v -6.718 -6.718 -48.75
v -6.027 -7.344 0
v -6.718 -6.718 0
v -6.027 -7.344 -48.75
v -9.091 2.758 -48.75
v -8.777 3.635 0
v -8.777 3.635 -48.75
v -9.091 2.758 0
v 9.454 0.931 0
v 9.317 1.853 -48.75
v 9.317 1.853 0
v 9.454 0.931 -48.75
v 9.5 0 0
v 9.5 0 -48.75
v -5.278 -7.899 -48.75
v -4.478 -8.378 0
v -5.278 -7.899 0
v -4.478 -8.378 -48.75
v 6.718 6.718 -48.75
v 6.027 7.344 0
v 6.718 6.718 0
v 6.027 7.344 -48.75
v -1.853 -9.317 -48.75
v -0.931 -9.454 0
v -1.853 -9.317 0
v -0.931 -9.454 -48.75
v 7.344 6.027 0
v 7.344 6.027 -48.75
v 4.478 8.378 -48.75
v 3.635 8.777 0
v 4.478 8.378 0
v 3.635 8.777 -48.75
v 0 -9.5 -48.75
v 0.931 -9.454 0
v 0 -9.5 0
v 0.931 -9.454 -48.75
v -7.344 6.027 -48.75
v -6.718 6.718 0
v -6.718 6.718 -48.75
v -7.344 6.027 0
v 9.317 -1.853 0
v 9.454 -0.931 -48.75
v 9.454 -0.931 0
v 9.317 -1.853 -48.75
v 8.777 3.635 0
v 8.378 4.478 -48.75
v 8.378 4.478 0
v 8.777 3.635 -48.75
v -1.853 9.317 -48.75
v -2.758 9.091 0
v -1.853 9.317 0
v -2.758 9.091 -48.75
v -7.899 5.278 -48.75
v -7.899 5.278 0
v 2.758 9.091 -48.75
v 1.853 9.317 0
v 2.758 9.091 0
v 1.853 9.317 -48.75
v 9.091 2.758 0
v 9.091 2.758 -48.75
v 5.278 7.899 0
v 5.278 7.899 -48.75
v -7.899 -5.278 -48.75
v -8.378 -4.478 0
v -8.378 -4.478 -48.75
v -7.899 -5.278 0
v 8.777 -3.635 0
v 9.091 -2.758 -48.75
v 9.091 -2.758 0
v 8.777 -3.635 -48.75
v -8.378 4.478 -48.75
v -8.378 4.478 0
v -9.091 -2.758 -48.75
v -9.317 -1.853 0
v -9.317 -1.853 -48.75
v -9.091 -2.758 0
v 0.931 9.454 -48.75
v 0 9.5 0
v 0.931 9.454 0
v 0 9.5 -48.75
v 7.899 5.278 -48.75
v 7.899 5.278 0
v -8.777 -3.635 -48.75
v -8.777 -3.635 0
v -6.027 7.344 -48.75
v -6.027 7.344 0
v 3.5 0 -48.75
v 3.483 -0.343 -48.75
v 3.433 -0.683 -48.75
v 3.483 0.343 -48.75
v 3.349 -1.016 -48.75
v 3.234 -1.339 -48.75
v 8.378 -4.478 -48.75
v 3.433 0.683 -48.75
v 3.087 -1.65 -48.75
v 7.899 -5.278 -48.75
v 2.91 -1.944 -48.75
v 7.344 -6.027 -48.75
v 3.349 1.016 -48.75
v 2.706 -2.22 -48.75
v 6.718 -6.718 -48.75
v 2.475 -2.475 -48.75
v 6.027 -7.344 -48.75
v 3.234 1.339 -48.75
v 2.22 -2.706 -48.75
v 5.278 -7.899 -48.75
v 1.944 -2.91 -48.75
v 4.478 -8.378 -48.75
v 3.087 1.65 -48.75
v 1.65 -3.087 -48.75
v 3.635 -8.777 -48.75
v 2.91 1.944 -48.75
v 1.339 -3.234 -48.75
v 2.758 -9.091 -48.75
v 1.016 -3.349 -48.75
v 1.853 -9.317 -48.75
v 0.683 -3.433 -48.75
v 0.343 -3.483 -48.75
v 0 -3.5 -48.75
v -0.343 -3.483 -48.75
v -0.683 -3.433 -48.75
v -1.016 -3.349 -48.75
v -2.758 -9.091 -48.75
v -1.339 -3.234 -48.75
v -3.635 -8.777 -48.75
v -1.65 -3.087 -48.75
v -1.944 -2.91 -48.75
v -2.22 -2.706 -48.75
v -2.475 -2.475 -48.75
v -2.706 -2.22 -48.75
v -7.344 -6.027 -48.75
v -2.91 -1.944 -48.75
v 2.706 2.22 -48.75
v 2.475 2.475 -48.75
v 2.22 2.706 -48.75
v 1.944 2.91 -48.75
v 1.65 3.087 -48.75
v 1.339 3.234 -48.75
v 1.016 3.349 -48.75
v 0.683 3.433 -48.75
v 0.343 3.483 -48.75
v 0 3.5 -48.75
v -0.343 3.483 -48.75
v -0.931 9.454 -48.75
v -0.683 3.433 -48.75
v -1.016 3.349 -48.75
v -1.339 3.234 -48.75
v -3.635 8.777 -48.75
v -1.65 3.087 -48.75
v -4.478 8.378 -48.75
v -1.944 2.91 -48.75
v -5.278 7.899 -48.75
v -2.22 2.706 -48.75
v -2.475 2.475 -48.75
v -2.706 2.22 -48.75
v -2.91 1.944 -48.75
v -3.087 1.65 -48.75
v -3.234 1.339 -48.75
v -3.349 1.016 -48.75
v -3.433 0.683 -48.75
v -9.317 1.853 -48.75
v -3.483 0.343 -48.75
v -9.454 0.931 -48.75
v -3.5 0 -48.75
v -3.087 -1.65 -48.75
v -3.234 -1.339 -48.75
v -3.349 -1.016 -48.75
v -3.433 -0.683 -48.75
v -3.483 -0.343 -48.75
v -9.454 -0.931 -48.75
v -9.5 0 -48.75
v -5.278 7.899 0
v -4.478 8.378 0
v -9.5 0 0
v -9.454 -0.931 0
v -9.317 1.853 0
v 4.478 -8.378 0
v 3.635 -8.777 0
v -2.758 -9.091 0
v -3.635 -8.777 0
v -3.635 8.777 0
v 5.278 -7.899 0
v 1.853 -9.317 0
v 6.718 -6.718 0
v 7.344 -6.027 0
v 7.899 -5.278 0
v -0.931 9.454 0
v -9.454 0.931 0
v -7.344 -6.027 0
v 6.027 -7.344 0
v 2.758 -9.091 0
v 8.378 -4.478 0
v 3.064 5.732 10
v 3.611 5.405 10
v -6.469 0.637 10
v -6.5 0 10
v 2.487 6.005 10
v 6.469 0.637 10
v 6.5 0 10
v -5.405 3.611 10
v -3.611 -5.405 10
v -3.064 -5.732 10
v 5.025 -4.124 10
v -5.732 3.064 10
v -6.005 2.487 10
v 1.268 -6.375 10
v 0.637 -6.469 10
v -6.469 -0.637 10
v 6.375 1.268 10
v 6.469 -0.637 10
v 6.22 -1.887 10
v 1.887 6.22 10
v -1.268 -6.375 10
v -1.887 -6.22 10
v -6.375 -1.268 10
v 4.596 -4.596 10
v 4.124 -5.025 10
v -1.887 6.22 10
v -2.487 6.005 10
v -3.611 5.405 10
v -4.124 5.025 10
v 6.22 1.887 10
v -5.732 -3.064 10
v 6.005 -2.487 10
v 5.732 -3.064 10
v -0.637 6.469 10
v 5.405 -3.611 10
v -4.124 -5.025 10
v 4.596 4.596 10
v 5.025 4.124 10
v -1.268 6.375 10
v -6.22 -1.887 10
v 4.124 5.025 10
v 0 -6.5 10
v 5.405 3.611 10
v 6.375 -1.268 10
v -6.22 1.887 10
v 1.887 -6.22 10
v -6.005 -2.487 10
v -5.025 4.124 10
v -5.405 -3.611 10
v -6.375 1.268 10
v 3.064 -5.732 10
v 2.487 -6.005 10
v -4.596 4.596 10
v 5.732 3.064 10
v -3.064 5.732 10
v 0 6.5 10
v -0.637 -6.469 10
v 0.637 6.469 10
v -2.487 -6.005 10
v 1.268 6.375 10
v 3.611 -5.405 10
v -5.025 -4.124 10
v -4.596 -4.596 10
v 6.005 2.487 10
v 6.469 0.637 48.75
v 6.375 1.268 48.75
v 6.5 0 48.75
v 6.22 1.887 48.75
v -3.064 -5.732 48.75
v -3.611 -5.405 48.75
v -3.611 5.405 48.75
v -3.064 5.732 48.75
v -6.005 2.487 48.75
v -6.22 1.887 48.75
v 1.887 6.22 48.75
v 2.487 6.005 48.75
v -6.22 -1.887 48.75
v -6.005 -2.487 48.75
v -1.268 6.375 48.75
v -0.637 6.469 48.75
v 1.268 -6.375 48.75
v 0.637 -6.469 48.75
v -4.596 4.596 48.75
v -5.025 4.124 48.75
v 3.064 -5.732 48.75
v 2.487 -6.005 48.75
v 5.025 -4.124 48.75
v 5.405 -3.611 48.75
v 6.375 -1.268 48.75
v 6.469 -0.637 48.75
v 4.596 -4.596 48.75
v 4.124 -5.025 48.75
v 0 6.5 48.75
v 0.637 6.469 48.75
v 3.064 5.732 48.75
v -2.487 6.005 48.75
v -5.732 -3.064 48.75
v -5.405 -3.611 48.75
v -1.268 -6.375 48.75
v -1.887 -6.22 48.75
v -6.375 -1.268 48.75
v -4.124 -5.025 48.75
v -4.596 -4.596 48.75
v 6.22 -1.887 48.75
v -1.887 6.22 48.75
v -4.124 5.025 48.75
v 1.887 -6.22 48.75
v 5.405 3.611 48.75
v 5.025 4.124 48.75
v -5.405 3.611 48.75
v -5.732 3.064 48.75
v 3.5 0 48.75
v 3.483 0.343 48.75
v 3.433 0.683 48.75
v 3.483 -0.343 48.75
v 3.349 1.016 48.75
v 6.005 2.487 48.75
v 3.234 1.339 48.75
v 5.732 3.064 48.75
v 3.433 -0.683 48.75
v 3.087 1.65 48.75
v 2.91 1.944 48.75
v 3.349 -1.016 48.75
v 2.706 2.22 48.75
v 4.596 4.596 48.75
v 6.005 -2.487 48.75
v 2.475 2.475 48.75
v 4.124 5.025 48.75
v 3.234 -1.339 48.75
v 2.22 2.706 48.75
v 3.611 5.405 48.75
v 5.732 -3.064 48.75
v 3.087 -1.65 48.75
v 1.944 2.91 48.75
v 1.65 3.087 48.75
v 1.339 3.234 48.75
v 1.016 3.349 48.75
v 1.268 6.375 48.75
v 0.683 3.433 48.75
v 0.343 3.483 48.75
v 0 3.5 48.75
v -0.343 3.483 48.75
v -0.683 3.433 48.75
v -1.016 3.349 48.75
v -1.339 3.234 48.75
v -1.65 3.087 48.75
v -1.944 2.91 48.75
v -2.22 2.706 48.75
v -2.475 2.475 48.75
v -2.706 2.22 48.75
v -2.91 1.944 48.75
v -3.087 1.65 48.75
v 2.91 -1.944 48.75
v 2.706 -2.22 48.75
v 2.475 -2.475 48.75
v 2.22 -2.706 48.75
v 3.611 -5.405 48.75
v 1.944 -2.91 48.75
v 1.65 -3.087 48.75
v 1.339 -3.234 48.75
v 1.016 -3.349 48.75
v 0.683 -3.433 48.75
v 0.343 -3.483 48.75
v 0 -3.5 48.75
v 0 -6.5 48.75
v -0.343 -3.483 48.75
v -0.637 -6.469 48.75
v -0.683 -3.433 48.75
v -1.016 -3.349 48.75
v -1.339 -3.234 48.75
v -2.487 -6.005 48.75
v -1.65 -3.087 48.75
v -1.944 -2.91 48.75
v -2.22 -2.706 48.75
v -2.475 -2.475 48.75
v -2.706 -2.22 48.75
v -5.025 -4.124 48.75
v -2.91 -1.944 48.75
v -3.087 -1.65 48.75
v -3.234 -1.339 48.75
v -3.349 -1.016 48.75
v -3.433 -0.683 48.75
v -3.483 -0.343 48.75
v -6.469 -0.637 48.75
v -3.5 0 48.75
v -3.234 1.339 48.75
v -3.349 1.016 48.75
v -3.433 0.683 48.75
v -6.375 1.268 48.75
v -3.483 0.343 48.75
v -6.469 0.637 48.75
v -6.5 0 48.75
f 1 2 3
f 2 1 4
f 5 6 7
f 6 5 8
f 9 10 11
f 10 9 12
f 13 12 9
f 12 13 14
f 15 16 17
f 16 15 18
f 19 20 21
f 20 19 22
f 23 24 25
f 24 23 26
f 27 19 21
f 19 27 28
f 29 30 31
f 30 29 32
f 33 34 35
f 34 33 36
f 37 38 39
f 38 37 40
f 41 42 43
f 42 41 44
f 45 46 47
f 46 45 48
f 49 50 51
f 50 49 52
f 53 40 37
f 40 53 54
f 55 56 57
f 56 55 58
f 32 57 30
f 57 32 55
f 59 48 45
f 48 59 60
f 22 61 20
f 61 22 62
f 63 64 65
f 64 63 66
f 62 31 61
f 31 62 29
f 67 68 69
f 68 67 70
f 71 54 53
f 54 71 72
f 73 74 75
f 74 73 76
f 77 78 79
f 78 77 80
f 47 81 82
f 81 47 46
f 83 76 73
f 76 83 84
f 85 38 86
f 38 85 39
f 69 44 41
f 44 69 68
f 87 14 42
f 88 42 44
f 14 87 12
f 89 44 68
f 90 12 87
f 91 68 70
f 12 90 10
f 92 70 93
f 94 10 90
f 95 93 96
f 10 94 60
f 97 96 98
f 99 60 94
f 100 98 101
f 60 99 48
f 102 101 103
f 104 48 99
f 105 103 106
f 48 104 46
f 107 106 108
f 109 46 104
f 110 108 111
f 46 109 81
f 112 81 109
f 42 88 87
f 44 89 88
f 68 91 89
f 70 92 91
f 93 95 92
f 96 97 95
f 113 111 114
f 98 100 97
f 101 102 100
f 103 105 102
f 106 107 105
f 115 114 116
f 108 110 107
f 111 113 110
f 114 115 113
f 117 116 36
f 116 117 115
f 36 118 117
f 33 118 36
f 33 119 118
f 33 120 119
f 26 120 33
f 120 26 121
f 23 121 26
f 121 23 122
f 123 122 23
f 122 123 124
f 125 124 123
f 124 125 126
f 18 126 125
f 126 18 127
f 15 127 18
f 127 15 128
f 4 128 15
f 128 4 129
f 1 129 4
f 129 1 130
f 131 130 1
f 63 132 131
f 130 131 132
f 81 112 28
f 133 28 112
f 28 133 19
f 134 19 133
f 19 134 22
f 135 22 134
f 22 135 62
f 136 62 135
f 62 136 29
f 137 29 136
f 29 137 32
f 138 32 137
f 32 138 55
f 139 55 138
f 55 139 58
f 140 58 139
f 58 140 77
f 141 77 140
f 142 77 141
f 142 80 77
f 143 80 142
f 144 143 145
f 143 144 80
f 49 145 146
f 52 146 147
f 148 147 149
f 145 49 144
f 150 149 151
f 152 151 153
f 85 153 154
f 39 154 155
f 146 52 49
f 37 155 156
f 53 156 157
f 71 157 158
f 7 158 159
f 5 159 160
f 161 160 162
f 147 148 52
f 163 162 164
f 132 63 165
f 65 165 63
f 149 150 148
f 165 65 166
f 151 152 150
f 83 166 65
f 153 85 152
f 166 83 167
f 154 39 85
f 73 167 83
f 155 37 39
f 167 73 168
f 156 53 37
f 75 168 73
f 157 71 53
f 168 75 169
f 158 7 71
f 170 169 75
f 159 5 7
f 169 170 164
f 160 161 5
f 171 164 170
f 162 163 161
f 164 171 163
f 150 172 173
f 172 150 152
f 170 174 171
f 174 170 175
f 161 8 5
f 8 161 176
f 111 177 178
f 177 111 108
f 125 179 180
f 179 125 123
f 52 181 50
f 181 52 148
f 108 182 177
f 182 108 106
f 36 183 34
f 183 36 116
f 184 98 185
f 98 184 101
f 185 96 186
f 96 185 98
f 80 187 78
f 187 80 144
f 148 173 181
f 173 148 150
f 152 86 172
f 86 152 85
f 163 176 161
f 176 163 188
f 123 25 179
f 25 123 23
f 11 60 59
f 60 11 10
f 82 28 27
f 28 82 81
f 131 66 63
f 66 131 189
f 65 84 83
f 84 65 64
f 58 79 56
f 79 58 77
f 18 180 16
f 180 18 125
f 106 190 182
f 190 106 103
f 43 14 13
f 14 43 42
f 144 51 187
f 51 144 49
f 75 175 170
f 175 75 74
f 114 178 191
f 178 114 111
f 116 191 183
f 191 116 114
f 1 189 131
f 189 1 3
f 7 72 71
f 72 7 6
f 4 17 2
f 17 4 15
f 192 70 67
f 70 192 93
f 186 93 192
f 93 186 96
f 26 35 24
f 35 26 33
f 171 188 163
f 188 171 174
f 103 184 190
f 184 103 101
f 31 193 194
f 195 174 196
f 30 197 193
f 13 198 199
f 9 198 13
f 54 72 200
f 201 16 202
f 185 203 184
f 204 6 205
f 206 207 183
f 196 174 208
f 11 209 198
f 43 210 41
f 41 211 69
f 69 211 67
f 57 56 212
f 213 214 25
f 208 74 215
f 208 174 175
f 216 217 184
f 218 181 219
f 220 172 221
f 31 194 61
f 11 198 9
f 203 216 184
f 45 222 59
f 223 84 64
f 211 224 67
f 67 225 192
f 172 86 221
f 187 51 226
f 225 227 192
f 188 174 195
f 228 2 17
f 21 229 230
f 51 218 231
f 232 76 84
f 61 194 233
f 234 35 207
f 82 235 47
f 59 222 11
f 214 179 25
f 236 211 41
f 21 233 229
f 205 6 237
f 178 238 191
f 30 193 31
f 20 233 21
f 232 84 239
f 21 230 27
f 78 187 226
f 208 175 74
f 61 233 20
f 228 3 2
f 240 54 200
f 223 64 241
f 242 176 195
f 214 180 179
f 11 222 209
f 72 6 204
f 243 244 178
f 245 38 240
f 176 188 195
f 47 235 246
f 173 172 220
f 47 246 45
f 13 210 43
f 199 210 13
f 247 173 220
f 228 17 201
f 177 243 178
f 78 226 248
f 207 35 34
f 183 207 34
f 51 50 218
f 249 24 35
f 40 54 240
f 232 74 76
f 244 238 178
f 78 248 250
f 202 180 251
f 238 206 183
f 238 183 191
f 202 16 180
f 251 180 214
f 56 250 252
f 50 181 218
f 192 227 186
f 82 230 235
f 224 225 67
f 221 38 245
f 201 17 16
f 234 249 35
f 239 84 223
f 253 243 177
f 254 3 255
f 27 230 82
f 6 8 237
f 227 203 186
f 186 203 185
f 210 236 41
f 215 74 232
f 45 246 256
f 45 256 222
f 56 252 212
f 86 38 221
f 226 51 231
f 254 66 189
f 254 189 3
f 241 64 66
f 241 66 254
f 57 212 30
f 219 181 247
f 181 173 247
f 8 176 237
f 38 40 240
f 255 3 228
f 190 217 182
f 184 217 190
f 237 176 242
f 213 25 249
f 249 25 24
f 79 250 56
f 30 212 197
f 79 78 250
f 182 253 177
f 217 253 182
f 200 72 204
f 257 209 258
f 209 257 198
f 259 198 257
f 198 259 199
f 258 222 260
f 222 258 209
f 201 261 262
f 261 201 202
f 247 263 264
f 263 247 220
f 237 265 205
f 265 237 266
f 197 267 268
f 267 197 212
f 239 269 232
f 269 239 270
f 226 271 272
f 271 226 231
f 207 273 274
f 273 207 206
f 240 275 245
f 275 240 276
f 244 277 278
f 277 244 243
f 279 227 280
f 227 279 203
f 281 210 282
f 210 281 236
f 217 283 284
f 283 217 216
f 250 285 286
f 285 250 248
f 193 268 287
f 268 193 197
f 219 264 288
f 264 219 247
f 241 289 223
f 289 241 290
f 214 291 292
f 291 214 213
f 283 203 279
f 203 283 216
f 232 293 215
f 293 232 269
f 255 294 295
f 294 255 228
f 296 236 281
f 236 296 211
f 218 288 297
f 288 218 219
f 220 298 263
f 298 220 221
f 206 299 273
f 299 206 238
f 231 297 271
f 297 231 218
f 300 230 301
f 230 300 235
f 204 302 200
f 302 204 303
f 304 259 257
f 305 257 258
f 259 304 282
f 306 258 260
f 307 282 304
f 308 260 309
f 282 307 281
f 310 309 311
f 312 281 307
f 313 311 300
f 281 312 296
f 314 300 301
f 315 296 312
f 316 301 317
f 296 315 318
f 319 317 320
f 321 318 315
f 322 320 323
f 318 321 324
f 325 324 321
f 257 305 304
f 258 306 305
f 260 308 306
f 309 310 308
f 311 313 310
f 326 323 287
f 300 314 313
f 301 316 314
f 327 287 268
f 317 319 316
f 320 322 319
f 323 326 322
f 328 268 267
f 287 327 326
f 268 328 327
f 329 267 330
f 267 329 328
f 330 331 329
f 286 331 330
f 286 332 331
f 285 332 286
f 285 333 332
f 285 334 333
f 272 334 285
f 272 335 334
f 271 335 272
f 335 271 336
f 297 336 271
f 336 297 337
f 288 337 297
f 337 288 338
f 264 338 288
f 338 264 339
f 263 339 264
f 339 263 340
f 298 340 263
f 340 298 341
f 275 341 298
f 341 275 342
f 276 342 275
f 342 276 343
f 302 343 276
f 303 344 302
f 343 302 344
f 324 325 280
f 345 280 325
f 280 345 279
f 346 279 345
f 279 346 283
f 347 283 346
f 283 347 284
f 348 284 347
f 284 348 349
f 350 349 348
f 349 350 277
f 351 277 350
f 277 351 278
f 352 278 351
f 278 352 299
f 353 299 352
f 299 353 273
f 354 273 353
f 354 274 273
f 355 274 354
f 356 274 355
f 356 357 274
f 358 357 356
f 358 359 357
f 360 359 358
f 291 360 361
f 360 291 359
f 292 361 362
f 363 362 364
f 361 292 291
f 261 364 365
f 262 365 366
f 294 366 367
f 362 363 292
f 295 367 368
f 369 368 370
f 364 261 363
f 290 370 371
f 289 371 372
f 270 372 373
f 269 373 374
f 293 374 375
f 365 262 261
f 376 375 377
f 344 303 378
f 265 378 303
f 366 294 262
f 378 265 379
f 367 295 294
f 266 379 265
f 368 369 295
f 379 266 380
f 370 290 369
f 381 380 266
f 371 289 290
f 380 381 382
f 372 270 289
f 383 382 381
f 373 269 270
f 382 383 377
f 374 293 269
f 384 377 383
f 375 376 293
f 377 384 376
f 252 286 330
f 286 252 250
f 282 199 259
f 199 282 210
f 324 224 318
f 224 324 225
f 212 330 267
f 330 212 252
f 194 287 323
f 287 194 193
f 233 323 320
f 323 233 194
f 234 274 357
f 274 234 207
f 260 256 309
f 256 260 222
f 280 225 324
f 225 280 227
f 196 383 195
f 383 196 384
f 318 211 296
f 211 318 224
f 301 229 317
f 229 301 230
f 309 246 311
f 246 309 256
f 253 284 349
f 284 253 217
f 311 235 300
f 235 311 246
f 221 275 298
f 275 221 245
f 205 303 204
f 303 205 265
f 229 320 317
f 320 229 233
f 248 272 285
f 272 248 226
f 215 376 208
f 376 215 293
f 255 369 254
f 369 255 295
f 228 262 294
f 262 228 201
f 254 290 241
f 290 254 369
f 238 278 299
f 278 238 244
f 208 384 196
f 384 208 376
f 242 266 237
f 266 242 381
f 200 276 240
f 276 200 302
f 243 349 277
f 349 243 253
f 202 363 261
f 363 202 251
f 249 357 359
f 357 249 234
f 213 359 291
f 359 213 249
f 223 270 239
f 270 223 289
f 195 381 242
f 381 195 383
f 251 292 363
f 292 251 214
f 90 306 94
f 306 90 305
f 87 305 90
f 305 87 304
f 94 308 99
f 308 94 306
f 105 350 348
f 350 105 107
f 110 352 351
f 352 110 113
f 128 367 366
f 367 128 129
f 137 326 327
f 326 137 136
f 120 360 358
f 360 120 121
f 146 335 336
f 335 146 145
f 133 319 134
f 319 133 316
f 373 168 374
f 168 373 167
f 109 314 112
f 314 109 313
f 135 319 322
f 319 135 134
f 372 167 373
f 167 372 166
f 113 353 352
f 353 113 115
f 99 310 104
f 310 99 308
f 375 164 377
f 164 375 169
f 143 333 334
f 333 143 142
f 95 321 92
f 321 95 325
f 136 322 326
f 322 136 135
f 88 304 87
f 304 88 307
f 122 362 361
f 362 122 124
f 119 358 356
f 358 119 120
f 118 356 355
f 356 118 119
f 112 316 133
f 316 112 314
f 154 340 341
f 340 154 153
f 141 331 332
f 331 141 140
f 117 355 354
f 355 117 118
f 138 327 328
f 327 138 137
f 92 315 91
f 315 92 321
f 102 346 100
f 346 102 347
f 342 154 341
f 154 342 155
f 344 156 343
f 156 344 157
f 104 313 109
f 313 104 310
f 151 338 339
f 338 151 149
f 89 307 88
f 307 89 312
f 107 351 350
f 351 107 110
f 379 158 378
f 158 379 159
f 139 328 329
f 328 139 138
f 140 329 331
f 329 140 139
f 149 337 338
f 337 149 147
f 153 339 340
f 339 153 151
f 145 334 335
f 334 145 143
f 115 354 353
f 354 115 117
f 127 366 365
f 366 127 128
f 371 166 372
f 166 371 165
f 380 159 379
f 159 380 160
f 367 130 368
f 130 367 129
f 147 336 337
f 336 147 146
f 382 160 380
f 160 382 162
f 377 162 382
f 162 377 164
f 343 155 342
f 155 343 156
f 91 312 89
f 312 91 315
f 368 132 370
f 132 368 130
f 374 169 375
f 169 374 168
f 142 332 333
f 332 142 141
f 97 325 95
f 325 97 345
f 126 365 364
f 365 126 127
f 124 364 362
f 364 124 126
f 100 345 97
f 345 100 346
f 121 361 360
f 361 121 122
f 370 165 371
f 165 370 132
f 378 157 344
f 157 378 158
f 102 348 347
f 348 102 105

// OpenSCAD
module hollow_tube() {
    $fn = 64;
    difference() {
        union() {
            // Bottom cylinder
            translate([0, 0, -48.75])
                cylinder(h = 48.75, r1 = 9.5, r2 = 9.5);
            // Frustum (conical transition)
            translate([0, 0, 0])
                cylinder(h = 10, r1 = 9.5, r2 = 6.5);
            // Top cylinder
            translate([0, 0, 10])
                cylinder(h = 38.75, r1 = 6.5, r2 = 6.5);
        }
        // Central through-bore
        translate([0, 0, -48.75])
            cylinder(h = 97.5, r = 3.5);
    }
}

hollow_tube();
